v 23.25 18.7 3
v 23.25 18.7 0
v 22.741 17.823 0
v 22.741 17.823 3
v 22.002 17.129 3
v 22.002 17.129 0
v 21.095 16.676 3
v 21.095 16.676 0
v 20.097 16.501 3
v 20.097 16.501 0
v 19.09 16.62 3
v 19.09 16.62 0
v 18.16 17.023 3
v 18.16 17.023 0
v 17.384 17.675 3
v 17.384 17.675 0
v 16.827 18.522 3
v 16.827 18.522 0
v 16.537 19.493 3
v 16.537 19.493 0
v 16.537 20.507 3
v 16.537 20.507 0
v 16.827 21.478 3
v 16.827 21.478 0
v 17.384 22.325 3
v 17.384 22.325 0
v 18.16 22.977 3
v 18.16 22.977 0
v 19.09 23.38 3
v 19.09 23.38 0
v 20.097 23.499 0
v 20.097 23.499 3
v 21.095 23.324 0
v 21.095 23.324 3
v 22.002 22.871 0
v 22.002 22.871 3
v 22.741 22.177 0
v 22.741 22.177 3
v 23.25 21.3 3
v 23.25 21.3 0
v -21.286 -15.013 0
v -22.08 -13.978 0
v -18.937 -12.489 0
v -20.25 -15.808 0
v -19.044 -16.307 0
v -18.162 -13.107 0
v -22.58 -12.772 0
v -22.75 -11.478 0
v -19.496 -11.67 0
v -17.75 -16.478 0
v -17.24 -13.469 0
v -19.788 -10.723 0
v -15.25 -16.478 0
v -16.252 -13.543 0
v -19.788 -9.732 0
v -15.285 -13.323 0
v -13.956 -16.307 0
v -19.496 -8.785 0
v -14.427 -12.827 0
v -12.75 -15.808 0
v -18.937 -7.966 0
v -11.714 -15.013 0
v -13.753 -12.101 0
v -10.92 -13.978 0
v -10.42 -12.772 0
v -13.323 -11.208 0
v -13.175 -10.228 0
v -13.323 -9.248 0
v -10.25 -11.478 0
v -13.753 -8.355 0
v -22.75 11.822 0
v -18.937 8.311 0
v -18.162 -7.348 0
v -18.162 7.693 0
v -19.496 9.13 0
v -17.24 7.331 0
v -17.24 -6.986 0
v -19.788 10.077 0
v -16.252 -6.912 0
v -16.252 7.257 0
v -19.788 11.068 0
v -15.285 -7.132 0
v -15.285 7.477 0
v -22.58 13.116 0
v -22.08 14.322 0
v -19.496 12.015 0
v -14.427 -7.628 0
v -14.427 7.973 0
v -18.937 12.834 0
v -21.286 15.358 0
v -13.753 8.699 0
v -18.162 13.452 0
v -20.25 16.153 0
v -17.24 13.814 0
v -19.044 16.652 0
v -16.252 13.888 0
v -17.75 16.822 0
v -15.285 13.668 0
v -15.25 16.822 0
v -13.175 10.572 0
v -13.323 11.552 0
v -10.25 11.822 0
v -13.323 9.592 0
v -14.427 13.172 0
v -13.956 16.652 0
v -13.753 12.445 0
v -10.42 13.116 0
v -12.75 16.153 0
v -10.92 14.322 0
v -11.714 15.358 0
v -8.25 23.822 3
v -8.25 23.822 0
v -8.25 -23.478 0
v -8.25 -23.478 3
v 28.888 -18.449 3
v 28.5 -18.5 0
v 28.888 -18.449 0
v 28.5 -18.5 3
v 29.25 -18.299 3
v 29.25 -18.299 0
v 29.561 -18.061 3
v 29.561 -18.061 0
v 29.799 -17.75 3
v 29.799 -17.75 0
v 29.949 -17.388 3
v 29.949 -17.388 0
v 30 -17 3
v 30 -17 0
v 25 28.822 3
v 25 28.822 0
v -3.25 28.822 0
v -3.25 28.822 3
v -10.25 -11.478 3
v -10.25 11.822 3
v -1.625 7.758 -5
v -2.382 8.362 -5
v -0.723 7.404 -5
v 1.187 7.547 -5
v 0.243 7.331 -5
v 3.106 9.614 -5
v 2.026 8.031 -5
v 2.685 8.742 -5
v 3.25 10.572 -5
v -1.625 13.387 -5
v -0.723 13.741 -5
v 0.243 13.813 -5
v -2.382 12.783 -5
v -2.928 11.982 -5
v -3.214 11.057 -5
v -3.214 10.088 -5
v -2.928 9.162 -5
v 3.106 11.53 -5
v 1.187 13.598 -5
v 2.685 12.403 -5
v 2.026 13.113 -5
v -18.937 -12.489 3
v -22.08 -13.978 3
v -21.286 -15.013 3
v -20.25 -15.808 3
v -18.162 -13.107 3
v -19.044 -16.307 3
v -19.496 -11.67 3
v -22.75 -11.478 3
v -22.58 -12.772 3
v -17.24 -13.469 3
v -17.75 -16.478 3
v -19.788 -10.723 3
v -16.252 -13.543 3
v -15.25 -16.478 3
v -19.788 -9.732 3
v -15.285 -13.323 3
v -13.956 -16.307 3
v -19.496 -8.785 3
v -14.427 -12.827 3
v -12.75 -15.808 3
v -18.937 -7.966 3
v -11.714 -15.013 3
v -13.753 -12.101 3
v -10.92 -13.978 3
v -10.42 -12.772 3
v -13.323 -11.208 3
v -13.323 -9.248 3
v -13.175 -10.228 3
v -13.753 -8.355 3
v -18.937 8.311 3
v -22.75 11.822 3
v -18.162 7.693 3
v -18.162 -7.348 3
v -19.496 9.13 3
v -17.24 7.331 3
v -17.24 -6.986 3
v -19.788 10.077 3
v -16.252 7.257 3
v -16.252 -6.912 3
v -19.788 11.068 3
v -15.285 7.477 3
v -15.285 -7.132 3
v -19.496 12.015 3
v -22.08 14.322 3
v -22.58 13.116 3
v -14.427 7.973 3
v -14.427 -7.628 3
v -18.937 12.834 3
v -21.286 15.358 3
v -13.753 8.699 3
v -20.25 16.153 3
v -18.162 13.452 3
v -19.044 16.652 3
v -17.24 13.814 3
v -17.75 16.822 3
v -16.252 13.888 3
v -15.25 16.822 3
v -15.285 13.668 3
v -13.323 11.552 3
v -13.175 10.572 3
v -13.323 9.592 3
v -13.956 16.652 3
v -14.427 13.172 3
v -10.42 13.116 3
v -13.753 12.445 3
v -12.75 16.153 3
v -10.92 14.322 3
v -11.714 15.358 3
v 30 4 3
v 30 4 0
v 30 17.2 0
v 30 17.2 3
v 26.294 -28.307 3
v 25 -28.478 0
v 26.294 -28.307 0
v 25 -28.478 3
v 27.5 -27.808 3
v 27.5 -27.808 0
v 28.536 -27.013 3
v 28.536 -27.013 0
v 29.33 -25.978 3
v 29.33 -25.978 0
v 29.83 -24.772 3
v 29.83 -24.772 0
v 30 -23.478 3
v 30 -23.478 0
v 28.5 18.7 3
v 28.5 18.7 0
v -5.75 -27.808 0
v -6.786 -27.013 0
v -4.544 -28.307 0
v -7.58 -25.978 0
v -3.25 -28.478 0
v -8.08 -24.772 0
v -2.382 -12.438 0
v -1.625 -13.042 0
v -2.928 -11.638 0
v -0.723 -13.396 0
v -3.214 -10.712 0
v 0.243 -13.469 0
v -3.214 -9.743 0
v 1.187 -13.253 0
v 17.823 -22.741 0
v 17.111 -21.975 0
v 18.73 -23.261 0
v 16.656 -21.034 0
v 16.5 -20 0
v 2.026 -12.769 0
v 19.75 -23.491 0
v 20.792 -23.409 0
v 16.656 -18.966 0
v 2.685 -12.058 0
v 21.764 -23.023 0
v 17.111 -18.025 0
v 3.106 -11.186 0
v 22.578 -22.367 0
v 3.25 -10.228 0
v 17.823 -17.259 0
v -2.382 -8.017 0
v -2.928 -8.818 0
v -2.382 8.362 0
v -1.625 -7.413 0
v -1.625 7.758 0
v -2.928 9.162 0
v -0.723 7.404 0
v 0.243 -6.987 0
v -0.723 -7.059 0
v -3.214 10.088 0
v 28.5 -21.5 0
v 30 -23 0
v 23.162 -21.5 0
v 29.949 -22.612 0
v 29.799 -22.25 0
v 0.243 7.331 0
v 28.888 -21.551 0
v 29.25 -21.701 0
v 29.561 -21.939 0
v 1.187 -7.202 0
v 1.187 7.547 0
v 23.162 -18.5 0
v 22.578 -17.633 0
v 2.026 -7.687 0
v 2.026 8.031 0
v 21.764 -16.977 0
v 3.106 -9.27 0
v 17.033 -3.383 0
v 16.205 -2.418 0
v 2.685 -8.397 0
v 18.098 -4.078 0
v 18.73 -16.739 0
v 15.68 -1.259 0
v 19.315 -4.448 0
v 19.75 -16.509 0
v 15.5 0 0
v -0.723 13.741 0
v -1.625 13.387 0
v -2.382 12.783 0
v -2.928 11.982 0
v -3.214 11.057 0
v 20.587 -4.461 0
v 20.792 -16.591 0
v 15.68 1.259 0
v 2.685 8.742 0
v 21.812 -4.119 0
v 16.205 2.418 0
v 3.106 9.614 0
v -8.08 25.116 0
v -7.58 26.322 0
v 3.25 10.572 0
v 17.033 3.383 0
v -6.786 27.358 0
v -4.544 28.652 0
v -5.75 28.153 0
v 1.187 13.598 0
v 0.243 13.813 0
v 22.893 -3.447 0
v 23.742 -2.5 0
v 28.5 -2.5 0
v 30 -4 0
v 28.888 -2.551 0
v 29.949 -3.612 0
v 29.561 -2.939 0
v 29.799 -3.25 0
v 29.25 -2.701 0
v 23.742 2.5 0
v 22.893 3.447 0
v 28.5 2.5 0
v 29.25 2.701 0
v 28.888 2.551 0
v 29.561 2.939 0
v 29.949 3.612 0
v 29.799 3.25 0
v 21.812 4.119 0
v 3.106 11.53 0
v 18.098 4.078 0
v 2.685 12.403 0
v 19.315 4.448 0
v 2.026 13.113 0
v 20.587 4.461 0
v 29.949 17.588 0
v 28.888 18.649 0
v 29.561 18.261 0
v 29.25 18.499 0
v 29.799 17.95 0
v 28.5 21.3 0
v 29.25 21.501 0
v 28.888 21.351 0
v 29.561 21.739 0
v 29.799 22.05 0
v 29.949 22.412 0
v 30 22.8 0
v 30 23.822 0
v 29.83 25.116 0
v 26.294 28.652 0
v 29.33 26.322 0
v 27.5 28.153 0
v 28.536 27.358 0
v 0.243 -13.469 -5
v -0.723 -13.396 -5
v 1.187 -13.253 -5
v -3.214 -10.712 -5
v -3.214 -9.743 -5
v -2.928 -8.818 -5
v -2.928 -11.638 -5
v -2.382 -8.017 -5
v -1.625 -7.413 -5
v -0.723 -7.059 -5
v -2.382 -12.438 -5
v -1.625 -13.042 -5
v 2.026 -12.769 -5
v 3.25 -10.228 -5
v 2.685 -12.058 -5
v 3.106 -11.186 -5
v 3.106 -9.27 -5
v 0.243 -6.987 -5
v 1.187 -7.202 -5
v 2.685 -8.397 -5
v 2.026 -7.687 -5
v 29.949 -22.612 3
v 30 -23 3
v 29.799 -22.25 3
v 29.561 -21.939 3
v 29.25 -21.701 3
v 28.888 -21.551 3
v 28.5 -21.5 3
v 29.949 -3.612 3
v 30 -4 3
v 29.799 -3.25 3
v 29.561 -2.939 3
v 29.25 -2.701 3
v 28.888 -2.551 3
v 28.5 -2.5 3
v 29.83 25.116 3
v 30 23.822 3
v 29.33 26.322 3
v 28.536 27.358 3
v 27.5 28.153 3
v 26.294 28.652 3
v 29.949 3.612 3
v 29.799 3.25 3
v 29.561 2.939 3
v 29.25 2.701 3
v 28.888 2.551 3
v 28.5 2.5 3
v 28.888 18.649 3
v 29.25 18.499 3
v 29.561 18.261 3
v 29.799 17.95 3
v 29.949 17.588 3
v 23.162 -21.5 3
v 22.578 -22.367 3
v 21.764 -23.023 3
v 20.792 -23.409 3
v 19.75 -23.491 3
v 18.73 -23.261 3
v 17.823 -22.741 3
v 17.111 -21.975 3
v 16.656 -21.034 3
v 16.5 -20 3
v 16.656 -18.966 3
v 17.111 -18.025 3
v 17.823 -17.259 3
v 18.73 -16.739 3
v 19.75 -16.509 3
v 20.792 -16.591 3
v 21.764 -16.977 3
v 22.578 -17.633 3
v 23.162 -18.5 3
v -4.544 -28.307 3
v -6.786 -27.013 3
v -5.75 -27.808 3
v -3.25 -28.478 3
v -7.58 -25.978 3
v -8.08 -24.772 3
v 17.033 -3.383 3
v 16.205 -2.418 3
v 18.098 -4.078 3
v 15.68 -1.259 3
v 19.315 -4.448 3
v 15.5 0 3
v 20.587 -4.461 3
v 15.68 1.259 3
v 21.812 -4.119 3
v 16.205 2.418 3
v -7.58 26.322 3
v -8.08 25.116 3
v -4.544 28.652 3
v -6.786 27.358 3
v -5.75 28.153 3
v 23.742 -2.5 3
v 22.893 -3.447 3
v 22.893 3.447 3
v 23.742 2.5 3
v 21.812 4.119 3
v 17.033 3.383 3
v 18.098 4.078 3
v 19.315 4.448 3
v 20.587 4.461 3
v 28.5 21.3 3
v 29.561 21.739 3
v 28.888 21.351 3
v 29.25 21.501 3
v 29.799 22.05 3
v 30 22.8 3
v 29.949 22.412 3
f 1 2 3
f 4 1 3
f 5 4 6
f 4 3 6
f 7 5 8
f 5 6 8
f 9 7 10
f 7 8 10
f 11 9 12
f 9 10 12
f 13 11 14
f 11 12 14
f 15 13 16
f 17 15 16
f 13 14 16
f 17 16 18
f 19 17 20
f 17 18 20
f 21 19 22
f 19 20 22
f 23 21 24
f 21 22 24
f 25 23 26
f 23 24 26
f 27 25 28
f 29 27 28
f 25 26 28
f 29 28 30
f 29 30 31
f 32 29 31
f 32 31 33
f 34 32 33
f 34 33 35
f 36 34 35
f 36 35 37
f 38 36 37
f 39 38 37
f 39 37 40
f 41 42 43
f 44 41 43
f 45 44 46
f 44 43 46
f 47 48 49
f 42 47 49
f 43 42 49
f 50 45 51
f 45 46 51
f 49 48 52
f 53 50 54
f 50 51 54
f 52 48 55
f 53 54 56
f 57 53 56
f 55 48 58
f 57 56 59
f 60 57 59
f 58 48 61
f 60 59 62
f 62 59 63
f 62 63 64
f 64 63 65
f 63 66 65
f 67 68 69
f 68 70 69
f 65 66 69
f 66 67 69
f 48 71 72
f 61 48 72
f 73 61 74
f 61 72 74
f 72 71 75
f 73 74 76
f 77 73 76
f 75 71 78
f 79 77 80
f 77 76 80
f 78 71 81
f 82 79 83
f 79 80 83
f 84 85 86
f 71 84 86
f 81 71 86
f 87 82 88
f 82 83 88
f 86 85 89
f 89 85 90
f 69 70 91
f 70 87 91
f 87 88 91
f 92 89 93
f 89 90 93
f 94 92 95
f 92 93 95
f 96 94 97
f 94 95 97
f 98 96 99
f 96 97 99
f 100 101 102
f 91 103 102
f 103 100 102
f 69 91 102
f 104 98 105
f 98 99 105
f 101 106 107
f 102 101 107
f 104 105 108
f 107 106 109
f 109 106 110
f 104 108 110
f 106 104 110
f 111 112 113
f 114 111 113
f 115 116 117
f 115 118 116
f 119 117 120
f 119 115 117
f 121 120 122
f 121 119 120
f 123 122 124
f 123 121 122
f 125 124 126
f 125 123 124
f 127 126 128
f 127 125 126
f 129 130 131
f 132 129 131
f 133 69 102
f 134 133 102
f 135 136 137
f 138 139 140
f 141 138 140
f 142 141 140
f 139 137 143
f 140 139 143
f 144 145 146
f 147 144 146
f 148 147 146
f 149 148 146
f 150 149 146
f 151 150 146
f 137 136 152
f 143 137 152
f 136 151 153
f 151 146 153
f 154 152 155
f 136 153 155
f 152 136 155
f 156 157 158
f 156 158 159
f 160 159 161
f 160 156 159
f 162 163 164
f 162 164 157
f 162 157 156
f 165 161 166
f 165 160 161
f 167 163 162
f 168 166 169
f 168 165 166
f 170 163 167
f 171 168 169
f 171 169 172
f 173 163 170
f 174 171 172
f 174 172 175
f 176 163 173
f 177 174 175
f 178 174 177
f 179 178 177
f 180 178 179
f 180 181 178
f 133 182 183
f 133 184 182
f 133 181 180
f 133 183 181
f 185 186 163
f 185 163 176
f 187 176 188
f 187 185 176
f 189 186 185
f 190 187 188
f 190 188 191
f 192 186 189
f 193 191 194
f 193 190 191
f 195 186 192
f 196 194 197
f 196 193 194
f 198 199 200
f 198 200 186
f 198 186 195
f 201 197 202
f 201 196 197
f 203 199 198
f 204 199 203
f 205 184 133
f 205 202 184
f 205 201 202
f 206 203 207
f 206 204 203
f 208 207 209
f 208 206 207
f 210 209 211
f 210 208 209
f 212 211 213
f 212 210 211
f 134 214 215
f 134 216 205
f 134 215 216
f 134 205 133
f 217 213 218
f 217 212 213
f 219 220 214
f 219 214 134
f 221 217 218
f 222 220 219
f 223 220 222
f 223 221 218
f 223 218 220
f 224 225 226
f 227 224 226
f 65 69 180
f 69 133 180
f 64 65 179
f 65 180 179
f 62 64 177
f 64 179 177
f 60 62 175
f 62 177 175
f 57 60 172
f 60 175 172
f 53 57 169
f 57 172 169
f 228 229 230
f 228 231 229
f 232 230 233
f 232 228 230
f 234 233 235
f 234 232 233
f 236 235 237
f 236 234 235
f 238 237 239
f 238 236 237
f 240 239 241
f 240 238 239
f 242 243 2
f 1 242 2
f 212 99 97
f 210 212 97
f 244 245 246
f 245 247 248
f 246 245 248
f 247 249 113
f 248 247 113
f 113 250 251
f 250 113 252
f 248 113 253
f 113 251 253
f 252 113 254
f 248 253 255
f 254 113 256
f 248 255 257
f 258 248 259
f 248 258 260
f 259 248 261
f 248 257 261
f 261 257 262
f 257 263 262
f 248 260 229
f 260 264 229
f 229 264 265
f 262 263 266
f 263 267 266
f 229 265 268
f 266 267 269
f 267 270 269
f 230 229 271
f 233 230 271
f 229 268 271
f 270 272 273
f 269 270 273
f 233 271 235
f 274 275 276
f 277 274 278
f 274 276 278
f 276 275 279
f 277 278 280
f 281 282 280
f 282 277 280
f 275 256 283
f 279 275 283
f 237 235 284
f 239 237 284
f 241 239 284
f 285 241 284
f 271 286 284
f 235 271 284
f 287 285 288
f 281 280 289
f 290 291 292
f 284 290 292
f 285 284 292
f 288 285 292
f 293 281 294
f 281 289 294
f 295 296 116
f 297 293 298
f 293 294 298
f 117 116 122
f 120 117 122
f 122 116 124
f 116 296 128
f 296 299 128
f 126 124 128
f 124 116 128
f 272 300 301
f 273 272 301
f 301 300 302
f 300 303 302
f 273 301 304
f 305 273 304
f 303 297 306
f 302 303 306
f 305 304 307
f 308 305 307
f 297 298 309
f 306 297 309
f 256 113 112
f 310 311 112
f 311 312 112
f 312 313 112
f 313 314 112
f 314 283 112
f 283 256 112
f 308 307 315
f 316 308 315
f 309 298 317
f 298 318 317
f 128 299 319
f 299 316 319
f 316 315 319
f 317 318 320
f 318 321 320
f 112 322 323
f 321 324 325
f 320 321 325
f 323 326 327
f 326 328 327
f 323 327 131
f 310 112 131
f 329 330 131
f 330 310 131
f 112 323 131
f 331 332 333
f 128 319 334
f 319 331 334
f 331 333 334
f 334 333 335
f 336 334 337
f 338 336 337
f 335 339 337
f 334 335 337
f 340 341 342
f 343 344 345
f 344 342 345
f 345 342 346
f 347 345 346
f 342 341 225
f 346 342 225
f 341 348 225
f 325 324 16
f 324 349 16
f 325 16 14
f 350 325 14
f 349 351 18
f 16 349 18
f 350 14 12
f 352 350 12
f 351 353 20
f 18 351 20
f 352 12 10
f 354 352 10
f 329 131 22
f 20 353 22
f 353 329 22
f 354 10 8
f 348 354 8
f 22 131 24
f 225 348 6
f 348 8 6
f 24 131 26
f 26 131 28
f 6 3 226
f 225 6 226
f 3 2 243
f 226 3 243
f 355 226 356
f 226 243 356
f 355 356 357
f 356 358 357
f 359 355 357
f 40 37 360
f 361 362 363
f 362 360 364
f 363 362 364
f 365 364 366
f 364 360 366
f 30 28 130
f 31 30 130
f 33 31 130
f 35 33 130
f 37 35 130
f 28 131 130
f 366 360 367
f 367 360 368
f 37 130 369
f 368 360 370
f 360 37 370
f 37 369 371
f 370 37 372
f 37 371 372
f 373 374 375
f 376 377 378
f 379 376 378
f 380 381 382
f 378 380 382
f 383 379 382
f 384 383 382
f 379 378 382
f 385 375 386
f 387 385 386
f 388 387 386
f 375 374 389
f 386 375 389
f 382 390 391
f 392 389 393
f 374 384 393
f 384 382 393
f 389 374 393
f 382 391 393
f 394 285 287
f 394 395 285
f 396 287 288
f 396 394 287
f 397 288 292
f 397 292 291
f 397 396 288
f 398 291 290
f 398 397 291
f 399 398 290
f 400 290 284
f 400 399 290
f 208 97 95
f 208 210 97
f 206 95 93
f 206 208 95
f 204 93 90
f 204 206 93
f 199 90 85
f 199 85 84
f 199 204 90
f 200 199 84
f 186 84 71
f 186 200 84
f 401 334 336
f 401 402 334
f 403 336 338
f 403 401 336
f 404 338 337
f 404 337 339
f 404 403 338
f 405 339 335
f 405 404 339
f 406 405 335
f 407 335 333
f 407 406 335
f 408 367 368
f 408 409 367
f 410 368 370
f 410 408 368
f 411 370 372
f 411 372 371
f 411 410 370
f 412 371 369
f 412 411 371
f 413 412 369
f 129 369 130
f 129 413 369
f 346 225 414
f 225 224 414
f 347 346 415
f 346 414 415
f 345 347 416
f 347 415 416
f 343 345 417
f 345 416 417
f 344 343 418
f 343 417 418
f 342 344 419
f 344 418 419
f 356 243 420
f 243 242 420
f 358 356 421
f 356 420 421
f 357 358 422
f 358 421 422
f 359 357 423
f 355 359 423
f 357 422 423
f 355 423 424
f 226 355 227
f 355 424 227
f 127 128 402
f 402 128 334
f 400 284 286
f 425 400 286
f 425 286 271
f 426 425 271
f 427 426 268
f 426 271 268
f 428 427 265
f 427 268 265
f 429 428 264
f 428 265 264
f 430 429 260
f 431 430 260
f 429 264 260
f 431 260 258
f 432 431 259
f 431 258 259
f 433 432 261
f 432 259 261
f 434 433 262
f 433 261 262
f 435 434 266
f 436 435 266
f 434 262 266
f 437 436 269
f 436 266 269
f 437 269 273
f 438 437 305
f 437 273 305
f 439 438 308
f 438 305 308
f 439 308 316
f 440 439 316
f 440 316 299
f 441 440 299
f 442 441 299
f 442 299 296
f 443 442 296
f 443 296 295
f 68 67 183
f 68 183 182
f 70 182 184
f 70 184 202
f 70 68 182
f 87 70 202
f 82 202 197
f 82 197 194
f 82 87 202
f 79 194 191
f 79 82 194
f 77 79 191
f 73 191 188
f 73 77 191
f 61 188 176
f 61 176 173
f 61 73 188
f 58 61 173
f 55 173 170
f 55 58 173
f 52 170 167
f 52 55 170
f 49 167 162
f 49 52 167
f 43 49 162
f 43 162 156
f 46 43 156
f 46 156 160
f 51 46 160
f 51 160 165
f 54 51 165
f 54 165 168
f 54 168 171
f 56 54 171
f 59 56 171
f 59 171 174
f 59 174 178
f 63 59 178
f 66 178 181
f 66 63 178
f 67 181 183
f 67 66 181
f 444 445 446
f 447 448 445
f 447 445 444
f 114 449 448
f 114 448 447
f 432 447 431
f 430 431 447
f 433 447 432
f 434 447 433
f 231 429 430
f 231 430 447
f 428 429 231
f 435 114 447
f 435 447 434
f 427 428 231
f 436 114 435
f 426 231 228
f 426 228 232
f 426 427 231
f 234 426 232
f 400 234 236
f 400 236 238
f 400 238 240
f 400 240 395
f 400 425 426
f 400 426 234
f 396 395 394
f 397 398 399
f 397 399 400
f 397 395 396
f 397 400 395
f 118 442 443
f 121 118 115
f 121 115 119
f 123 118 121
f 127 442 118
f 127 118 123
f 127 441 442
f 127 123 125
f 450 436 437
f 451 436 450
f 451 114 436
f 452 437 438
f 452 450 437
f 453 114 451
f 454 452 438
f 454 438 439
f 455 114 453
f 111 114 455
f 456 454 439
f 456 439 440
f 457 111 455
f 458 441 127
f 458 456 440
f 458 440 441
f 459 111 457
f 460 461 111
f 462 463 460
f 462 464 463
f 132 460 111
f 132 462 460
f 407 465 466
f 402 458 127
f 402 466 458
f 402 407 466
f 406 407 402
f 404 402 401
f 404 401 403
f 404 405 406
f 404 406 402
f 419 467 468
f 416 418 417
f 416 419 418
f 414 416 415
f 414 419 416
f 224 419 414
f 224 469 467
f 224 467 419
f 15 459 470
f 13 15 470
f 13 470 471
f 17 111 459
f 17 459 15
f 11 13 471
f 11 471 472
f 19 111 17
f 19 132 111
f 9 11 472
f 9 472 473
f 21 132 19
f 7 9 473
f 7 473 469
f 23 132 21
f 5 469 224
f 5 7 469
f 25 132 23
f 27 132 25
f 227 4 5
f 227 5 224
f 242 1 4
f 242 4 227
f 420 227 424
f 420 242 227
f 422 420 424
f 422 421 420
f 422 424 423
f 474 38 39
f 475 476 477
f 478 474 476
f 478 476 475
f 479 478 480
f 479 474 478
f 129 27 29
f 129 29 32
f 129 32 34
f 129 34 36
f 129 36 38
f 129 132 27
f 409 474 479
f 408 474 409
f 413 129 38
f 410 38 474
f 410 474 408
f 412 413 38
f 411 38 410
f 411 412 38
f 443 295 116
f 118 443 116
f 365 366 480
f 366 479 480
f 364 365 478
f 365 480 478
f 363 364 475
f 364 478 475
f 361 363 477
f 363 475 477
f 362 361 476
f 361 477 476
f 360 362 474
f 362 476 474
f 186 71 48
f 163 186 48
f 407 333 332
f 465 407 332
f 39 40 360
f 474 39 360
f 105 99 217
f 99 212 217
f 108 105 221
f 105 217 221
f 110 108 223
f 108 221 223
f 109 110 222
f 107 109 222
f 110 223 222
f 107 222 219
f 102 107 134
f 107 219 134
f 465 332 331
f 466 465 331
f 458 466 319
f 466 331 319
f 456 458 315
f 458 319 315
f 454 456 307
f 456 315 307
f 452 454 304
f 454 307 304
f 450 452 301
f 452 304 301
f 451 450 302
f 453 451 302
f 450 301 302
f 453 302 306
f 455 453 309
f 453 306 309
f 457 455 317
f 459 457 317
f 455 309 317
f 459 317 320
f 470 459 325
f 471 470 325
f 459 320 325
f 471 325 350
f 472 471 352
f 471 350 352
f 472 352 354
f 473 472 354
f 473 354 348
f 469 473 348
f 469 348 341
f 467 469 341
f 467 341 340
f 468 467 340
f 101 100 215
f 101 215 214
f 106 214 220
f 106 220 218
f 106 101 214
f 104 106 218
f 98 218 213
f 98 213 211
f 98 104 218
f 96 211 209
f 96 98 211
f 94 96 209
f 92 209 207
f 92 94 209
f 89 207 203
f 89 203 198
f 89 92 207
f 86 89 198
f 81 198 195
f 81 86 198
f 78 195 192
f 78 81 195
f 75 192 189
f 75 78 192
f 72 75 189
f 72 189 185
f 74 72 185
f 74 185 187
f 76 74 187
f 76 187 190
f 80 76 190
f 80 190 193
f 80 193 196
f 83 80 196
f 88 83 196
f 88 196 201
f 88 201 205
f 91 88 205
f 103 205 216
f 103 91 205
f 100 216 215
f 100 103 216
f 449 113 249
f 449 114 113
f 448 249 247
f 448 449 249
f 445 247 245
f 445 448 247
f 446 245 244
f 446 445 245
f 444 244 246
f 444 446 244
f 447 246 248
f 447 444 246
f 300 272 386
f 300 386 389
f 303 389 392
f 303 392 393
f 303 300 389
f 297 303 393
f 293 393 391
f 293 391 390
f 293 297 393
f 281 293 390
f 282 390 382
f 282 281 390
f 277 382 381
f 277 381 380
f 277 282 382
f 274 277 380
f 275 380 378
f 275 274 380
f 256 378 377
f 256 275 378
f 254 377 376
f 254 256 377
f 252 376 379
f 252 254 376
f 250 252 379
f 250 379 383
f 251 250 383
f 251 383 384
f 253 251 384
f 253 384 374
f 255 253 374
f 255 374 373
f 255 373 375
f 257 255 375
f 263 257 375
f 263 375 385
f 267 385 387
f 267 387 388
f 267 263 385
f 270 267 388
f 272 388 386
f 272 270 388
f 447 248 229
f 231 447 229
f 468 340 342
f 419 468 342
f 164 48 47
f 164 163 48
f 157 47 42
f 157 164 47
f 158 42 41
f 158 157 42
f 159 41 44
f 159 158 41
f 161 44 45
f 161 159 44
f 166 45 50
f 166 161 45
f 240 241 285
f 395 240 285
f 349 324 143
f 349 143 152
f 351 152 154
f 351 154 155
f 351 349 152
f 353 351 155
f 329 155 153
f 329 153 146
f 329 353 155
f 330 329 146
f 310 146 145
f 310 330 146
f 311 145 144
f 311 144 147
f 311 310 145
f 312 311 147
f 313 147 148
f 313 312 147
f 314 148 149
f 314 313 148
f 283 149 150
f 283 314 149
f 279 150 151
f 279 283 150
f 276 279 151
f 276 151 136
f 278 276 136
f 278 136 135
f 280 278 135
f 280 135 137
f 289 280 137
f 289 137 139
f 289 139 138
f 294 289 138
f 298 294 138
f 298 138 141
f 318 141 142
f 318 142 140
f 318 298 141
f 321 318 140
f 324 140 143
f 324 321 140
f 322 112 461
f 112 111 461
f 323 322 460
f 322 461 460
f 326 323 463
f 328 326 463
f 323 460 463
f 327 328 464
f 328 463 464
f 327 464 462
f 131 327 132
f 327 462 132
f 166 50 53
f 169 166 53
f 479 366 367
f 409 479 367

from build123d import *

# Parameters (mm, degrees)
F0_R     = 3.25
F1_DEPTH = 3
F2_R     = 5
F3_DEPTH = 5
F0_R_2   = 3.325
F4_DEPTH = 3
F5_R     = 5
F6_R     = 1.5


with BuildPart() as f1:
    # F0 (on Top) → F1 (new body)
    with BuildSketch(Plane.XY):
        with BuildLine():
            Line((-8.25, 28.8223753949), (-8.25, -28.4776246051))
            Line((-8.25, -28.4776246051), (30, -28.4776246051))
            Line((30, -28.4776246051), (30, -21.5))
            Line((30, -21.5), (23.1622776602, -21.5))
            ThreePointArc((23.1622776602, -21.5), (16.5, -20), (23.1622776602, -18.5))
            Line((23.1622776602, -18.5), (30, -18.5))
            Line((30, -18.5), (30, -2.5))
            Line((30, -2.5), (23.7416573868, -2.5))
            ThreePointArc((23.7416573868, -2.5), (15.5, 0), (23.7416573868, 2.5))
            Line((23.7416573868, 2.5), (30, 2.5))
            Line((30, 2.5), (30, 18.7))
            Line((30, 18.7), (23.2496153619, 18.7))
            ThreePointArc((23.2496153619, 18.7), (16.5, 20), (23.2496153619, 21.3))
            Line((23.2496153619, 21.3), (30, 21.3))
            Line((30, 21.3), (30, 28.8223753949))
            Line((30, 28.8223753949), (-8.25, 28.8223753949))
        make_face()
        with Locations((0, -10.2276246051)):
            Circle(F0_R, mode=Mode.SUBTRACT)
        with Locations((0, 10.5723753949)):
            Circle(F0_R, mode=Mode.SUBTRACT)
        with Locations((0, 10.5723753949)):
            Circle(F0_R)
        with Locations((0, -10.2276246051)):
            Circle(F0_R)
    extrude(amount=F1_DEPTH)

    # F2
    f2_edges = [f1.edges().sort_by_distance(p)[0] for p in [
        (-8.25, 28.822375, 1.5),
        (-8.25, -28.477625, 1.5),
        (30, -28.477625, 1.5),
        (30, 28.822375, 1.5),
    ]]
    fillet(f2_edges, radius=F2_R)

    # F0 (on Top) → F3 (join)
    with BuildSketch(Plane.XY):
        with Locations((0, 10.5723753949)):
            Circle(F0_R)
        with Locations((0, -10.2276246051)):
            Circle(F0_R)
    extrude(amount=-F3_DEPTH)

    # F6
    f6_edges = [f1.edges().sort_by_distance(p)[0] for p in [
        (30, -2.5, 1.5),
        (30, 2.5, 1.5),
        (30, 18.7, 1.5),
        (30, 21.3, 1.5),
        (30, -21.5, 1.5),
        (30, -18.5, 1.5),
    ]]
    fillet(f6_edges, radius=F6_R)


with BuildPart() as f4:
    # F0 (on Top) → F4 (new body)
    with BuildSketch(Plane.XY):
        Polygon((-10.25, 16.8223753949), (-16.5, 16.8223753949), (-22.75, 16.8223753949), (-22.75, -16.4776246051), (-16.5, -16.4776246051), (-10.25, -16.4776246051), align=None)
        with Locations((-16.5, -10.2276246051)):
            Circle(F0_R_2, mode=Mode.SUBTRACT)
        with Locations((-16.5, 10.5723753949)):
            Circle(F0_R_2, mode=Mode.SUBTRACT)
    extrude(amount=F4_DEPTH)

    # F5
    f5_edges = [f4.edges().sort_by_distance(p)[0] for p in [
        (-22.75, 16.822375, 1.5),
        (-22.75, -16.477625, 1.5),
        (-10.25, 16.822375, 1.5),
        (-10.25, -16.477625, 1.5),
    ]]
    fillet(f5_edges, radius=F5_R)


solid = Compound([f1.part, f4.part])
